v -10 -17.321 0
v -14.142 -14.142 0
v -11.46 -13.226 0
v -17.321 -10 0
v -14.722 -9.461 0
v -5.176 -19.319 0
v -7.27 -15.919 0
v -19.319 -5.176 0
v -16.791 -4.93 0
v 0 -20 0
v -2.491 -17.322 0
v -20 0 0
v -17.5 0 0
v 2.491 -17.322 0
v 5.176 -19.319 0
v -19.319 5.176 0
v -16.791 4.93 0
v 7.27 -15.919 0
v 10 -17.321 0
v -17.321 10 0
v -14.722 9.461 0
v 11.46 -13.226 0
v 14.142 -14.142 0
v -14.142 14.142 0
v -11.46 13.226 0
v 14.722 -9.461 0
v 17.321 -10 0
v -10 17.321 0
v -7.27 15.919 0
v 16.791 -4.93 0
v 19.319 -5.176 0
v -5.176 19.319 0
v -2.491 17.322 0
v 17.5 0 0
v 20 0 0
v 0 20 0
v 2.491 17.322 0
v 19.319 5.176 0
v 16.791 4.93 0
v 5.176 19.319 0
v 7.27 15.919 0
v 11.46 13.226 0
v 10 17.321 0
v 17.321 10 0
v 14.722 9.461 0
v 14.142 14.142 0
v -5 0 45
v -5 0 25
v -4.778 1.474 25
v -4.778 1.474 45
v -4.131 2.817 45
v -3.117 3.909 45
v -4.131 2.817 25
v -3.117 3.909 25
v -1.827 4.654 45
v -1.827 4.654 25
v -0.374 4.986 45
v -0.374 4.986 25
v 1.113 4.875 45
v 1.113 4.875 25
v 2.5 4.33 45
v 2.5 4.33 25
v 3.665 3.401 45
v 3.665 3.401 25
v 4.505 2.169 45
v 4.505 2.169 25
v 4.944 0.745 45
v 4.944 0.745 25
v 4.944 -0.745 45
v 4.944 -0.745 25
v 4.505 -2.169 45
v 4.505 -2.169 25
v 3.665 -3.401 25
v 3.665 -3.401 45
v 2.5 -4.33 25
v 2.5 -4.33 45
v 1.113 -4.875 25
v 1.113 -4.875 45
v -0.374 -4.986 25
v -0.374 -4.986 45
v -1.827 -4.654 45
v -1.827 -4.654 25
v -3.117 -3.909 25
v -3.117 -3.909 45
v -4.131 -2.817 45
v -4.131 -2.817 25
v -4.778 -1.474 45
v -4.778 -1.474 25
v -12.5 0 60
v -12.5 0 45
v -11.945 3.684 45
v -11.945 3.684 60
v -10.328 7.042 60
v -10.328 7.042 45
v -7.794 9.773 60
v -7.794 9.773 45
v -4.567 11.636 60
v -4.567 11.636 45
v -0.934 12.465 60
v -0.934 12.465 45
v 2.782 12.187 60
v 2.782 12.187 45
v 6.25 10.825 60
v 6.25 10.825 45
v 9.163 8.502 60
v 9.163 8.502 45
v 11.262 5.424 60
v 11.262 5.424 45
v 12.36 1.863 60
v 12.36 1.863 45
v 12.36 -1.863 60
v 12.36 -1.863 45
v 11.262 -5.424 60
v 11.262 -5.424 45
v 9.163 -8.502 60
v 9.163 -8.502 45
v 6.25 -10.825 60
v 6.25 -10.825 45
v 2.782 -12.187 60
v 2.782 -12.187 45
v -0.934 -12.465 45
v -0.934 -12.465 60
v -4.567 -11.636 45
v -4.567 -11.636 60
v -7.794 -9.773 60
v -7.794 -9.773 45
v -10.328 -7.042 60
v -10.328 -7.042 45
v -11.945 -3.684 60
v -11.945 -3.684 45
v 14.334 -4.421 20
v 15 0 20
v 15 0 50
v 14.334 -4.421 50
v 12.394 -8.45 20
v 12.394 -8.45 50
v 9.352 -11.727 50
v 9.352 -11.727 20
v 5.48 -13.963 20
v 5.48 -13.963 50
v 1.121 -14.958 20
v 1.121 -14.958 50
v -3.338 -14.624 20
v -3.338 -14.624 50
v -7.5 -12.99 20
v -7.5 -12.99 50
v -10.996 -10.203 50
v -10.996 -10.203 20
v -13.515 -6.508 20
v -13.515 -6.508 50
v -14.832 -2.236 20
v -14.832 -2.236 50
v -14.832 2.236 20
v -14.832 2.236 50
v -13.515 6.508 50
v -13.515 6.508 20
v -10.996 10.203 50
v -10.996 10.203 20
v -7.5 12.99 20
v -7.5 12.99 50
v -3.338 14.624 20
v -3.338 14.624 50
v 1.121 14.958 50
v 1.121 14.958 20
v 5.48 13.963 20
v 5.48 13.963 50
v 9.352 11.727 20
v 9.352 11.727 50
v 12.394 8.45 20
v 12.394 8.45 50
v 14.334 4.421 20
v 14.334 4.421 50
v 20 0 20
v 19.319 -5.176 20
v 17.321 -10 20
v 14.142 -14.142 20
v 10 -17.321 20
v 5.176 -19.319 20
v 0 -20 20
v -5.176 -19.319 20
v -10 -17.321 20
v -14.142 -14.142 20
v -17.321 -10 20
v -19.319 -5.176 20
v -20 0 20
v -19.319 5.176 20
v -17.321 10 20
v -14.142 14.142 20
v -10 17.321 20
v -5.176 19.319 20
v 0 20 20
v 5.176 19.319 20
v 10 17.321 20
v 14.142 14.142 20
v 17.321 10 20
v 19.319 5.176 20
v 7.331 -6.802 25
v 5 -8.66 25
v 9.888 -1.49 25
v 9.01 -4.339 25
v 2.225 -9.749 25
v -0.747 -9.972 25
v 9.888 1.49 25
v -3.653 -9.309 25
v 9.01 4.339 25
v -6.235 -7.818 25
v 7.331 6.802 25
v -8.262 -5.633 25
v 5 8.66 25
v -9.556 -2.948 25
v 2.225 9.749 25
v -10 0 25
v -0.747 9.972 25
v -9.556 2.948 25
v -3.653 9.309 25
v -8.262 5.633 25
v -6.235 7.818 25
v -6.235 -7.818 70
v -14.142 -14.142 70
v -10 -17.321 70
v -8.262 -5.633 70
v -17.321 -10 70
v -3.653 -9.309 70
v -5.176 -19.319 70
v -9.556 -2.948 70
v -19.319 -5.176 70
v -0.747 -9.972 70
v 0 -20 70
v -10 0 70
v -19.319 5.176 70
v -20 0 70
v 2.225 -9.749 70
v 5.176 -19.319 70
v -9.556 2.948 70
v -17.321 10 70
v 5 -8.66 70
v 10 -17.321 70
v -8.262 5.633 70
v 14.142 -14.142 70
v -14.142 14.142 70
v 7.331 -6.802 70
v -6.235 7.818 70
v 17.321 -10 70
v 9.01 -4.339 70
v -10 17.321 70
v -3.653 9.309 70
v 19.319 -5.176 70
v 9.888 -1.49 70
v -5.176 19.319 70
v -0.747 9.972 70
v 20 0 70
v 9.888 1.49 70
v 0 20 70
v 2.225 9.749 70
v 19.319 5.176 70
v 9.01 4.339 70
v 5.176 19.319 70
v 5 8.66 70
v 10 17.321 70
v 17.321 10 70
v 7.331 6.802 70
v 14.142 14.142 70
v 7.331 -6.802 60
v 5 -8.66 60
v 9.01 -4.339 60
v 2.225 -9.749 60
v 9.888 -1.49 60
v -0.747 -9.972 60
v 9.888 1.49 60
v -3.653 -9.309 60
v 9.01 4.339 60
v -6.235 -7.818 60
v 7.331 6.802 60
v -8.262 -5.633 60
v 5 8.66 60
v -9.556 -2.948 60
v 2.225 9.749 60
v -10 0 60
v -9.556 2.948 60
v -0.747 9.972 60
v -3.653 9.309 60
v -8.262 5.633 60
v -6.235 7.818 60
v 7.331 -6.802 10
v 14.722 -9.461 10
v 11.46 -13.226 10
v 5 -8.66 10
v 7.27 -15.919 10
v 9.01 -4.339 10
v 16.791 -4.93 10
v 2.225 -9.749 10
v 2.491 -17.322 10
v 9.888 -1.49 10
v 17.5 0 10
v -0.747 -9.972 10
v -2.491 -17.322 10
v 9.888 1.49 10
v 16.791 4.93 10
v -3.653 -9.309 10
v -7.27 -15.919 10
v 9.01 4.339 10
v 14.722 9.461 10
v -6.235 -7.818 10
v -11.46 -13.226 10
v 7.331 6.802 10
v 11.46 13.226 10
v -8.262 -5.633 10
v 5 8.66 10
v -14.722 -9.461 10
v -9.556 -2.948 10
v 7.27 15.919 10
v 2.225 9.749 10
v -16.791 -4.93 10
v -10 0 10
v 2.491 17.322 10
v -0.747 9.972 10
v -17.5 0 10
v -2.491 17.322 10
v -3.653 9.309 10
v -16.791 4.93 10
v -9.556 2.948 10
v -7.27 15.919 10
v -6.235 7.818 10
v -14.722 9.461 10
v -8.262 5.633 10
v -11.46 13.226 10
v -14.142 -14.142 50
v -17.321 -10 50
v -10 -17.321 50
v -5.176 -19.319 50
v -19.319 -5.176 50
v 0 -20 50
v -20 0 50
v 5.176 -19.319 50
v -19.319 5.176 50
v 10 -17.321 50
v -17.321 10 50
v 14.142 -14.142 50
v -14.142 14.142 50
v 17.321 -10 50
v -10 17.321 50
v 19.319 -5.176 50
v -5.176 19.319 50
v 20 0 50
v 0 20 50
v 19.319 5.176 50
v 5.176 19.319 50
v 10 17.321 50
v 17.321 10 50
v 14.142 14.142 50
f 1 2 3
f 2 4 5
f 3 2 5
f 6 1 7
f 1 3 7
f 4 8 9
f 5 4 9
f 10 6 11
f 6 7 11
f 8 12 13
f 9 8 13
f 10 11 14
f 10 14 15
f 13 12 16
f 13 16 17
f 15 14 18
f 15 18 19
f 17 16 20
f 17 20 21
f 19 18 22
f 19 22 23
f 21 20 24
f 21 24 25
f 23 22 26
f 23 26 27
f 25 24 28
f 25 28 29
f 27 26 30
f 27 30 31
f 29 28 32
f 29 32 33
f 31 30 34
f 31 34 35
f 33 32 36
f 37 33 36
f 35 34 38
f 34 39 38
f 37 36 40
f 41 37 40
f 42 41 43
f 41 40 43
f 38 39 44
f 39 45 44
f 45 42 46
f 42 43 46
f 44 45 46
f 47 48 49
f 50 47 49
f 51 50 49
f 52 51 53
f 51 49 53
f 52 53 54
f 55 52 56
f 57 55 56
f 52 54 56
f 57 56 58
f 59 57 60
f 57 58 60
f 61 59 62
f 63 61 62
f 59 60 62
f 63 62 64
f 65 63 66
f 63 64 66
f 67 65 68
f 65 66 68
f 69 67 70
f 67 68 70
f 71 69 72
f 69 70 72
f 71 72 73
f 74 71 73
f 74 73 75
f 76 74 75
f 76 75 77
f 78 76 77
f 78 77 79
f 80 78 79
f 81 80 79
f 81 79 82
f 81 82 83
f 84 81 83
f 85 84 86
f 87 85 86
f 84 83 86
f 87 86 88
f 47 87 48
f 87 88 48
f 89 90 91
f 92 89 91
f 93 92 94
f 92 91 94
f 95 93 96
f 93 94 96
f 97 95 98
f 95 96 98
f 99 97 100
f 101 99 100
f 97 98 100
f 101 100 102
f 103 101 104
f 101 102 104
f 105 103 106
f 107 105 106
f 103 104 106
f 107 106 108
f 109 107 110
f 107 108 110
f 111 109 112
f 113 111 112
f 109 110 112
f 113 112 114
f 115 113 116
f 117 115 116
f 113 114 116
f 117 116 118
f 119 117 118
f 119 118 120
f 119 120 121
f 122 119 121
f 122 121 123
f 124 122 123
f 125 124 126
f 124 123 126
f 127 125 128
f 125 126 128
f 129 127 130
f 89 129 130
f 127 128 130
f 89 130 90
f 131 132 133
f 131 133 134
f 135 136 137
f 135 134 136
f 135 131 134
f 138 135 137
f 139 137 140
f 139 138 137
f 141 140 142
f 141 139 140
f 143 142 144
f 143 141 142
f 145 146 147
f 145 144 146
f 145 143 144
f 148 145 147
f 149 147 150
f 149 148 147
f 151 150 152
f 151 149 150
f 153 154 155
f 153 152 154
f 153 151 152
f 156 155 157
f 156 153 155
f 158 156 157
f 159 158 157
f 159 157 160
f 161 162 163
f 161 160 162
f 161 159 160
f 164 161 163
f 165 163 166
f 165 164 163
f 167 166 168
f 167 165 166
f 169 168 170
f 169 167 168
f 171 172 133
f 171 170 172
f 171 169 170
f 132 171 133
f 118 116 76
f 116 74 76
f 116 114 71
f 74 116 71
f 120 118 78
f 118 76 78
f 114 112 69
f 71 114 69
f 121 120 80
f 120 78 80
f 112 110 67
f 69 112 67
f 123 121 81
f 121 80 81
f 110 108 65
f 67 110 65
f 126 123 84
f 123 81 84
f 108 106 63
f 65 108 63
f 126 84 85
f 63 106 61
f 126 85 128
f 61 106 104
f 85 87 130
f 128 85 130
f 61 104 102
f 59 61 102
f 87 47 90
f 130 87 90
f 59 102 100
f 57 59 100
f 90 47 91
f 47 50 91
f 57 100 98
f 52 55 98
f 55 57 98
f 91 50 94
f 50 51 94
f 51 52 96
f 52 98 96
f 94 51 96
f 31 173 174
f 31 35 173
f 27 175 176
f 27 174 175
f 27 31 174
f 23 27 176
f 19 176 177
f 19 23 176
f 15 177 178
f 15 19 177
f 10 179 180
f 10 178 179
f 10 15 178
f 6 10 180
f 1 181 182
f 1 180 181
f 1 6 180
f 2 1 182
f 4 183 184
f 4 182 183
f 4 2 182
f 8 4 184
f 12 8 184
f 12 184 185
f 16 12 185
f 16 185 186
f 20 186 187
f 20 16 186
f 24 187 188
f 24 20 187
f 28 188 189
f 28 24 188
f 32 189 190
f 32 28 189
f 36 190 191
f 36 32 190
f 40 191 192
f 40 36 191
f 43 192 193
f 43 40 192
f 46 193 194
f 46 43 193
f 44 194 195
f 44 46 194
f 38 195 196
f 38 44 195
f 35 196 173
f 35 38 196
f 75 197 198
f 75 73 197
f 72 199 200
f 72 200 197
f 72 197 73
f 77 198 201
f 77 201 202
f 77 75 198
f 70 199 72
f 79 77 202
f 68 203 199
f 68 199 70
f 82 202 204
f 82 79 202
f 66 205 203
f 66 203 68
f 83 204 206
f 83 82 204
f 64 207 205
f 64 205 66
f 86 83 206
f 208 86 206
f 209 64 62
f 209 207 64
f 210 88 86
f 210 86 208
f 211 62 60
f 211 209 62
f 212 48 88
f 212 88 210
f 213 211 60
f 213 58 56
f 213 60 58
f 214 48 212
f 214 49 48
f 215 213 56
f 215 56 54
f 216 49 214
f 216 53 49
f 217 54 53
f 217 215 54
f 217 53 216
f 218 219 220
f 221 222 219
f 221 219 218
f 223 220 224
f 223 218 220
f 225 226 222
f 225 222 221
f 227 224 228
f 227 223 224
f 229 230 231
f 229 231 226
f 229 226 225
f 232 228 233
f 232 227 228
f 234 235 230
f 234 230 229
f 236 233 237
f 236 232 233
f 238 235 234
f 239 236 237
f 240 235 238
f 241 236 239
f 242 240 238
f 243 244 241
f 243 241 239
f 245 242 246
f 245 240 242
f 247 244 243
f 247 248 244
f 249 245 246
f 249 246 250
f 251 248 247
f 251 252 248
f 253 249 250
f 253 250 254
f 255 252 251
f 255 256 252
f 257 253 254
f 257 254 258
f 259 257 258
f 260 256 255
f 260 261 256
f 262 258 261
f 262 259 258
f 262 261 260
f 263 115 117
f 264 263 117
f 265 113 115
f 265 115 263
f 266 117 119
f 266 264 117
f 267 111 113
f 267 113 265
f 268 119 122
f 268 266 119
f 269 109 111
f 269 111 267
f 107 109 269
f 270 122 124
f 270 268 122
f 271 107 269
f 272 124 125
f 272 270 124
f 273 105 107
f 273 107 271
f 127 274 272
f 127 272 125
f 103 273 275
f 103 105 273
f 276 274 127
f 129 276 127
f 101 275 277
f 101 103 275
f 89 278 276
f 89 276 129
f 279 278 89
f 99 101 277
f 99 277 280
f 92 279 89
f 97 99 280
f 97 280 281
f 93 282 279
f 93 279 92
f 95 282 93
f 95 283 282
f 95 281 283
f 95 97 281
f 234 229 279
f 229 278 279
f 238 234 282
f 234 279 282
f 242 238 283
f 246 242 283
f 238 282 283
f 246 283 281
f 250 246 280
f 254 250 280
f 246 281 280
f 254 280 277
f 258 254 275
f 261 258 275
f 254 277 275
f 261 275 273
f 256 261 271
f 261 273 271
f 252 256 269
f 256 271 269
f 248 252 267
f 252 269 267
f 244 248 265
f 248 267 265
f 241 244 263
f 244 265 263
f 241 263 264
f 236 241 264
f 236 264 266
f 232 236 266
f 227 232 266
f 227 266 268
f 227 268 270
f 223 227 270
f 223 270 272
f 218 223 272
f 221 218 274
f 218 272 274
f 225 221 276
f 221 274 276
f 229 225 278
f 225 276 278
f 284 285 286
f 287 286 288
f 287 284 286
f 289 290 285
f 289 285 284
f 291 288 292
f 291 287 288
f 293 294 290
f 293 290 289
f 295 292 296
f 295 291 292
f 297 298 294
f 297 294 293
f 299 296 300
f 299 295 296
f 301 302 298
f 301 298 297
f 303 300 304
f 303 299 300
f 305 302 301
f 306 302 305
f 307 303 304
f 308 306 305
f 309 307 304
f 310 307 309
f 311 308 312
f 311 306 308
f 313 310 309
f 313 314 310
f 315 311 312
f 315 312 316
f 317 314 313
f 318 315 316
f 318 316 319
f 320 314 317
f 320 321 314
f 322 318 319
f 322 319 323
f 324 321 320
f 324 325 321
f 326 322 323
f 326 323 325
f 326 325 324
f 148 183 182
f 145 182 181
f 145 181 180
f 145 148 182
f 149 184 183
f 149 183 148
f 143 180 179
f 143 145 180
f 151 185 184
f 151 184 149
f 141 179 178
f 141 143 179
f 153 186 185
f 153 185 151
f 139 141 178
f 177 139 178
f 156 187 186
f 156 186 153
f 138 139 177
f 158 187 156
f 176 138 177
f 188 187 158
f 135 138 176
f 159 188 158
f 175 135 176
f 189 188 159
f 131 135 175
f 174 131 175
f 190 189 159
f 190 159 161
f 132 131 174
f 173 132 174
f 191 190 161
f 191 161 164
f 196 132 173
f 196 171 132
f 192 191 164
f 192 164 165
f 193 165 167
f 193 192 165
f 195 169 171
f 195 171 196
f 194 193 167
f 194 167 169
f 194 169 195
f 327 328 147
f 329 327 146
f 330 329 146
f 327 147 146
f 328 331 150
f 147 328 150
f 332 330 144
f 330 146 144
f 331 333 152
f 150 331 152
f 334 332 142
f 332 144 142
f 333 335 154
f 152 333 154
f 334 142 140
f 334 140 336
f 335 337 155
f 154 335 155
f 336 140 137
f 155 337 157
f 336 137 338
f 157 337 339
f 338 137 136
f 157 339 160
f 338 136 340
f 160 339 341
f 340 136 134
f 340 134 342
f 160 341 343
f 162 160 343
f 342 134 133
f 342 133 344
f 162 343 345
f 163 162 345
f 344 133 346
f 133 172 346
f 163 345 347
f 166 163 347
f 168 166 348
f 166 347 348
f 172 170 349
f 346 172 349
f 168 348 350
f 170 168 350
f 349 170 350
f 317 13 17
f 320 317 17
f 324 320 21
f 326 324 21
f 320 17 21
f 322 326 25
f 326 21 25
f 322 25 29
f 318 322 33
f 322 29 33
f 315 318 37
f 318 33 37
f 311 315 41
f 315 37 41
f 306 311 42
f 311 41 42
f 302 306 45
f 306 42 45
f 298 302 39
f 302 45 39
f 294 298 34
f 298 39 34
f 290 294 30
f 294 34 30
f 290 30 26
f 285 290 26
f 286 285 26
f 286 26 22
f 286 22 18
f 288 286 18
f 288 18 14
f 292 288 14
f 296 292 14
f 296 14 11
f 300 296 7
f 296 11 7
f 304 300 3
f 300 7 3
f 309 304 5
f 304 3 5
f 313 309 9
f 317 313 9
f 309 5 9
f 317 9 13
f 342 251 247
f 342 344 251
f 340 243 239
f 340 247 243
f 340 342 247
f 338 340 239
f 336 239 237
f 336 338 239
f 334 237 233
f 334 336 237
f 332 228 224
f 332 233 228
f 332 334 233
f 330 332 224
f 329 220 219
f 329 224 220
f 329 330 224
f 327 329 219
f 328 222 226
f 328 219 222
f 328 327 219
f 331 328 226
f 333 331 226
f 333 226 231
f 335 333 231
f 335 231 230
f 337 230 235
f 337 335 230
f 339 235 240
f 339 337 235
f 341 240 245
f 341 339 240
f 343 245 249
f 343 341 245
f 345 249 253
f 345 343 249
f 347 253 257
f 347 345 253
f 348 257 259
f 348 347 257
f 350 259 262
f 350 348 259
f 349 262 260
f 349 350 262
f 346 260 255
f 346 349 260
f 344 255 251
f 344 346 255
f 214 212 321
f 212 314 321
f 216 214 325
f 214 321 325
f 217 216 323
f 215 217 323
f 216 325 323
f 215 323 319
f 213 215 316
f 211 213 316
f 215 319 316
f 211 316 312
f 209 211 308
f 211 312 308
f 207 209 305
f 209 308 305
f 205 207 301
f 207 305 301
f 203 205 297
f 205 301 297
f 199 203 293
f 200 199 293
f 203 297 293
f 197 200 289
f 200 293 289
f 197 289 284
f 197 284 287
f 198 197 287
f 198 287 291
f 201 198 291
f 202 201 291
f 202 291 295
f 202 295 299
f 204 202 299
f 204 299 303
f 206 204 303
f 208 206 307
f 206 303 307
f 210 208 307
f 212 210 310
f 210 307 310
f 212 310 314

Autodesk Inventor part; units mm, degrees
ref_plane "YZ Plane" through (0, 0, 0) normal (1, 0, 0) x (0, 1, 0)
ref_plane "XZ Plane" through (0, 0, 0) normal (0, 1, 0) x (-1, 0, 0)
ref_plane "XY Plane" through (0, 0, 0) normal (0, 0, 1) x (1, 0, 0)
sketch "스케치1" plane through (0, 0, 0) normal (0, 0, 1) x (1, 0, 0)
  circle A0 centre (0, 0) radius 20
  dimension "d0" = 40
extrude "돌출1" add sketch "스케치1" along normal blind 20
sketch "스케치2" plane through (0, 0, 20) normal (0, 0, 1) x (1, 0, 0)
  circle A0 centre (0, 0) radius 15
  dimension "d3" = 30
extrude "돌출2" add sketch "스케치2" along normal blind 30
sketch "스케치3" plane through (0, 0, 50) normal (0, 0, 1) x (1, 0, 0)
  circle A0 centre (0, 0) radius 20
  dimension "d6" = 40
extrude "돌출3" add sketch "스케치3" along normal blind 20
sketch "스케치4" plane through (0, 0, 0) normal (0, 0, -1) x (-1, 0, 0)
  circle A0 centre (0, 0) radius 17.5
  dimension "d9" = 35
extrude "돌출4" cut sketch "스케치4" against normal blind 10
sketch "스케치5" plane through (0, 0, 10) normal (0, 0, -1) x (-1, 0, 0)
  circle A0 centre (0, 0) radius 10
  dimension "d12" = 20
extrude "돌출5" cut sketch "스케치5" against normal blind 15
sketch "스케치6" plane through (0, 0, 25) normal (0, 0, -1) x (-1, 0, 0)
  circle A0 centre (0, 0) radius 5
  dimension "d15" = 10
extrude "돌출6" cut sketch "스케치6" against normal blind 20
sketch "스케치9" plane through (0, 0, 45) normal (0, 0, -1) x (-1, 0, 0)
  circle A0 centre (0, 0) radius 12.5
  dimension "d22" = 25
extrude "돌출8" cut sketch "스케치9" against normal blind 15
sketch "스케치10" plane through (0, 0, 60) normal (0, 0, -1) x (-1, 0, 0)
  circle A0 centre (0, 0) radius 10
  dimension "d25" = 20
extrude "돌출9" cut sketch "스케치10" against normal up to next
properties part number "기본 투상 연습1"
